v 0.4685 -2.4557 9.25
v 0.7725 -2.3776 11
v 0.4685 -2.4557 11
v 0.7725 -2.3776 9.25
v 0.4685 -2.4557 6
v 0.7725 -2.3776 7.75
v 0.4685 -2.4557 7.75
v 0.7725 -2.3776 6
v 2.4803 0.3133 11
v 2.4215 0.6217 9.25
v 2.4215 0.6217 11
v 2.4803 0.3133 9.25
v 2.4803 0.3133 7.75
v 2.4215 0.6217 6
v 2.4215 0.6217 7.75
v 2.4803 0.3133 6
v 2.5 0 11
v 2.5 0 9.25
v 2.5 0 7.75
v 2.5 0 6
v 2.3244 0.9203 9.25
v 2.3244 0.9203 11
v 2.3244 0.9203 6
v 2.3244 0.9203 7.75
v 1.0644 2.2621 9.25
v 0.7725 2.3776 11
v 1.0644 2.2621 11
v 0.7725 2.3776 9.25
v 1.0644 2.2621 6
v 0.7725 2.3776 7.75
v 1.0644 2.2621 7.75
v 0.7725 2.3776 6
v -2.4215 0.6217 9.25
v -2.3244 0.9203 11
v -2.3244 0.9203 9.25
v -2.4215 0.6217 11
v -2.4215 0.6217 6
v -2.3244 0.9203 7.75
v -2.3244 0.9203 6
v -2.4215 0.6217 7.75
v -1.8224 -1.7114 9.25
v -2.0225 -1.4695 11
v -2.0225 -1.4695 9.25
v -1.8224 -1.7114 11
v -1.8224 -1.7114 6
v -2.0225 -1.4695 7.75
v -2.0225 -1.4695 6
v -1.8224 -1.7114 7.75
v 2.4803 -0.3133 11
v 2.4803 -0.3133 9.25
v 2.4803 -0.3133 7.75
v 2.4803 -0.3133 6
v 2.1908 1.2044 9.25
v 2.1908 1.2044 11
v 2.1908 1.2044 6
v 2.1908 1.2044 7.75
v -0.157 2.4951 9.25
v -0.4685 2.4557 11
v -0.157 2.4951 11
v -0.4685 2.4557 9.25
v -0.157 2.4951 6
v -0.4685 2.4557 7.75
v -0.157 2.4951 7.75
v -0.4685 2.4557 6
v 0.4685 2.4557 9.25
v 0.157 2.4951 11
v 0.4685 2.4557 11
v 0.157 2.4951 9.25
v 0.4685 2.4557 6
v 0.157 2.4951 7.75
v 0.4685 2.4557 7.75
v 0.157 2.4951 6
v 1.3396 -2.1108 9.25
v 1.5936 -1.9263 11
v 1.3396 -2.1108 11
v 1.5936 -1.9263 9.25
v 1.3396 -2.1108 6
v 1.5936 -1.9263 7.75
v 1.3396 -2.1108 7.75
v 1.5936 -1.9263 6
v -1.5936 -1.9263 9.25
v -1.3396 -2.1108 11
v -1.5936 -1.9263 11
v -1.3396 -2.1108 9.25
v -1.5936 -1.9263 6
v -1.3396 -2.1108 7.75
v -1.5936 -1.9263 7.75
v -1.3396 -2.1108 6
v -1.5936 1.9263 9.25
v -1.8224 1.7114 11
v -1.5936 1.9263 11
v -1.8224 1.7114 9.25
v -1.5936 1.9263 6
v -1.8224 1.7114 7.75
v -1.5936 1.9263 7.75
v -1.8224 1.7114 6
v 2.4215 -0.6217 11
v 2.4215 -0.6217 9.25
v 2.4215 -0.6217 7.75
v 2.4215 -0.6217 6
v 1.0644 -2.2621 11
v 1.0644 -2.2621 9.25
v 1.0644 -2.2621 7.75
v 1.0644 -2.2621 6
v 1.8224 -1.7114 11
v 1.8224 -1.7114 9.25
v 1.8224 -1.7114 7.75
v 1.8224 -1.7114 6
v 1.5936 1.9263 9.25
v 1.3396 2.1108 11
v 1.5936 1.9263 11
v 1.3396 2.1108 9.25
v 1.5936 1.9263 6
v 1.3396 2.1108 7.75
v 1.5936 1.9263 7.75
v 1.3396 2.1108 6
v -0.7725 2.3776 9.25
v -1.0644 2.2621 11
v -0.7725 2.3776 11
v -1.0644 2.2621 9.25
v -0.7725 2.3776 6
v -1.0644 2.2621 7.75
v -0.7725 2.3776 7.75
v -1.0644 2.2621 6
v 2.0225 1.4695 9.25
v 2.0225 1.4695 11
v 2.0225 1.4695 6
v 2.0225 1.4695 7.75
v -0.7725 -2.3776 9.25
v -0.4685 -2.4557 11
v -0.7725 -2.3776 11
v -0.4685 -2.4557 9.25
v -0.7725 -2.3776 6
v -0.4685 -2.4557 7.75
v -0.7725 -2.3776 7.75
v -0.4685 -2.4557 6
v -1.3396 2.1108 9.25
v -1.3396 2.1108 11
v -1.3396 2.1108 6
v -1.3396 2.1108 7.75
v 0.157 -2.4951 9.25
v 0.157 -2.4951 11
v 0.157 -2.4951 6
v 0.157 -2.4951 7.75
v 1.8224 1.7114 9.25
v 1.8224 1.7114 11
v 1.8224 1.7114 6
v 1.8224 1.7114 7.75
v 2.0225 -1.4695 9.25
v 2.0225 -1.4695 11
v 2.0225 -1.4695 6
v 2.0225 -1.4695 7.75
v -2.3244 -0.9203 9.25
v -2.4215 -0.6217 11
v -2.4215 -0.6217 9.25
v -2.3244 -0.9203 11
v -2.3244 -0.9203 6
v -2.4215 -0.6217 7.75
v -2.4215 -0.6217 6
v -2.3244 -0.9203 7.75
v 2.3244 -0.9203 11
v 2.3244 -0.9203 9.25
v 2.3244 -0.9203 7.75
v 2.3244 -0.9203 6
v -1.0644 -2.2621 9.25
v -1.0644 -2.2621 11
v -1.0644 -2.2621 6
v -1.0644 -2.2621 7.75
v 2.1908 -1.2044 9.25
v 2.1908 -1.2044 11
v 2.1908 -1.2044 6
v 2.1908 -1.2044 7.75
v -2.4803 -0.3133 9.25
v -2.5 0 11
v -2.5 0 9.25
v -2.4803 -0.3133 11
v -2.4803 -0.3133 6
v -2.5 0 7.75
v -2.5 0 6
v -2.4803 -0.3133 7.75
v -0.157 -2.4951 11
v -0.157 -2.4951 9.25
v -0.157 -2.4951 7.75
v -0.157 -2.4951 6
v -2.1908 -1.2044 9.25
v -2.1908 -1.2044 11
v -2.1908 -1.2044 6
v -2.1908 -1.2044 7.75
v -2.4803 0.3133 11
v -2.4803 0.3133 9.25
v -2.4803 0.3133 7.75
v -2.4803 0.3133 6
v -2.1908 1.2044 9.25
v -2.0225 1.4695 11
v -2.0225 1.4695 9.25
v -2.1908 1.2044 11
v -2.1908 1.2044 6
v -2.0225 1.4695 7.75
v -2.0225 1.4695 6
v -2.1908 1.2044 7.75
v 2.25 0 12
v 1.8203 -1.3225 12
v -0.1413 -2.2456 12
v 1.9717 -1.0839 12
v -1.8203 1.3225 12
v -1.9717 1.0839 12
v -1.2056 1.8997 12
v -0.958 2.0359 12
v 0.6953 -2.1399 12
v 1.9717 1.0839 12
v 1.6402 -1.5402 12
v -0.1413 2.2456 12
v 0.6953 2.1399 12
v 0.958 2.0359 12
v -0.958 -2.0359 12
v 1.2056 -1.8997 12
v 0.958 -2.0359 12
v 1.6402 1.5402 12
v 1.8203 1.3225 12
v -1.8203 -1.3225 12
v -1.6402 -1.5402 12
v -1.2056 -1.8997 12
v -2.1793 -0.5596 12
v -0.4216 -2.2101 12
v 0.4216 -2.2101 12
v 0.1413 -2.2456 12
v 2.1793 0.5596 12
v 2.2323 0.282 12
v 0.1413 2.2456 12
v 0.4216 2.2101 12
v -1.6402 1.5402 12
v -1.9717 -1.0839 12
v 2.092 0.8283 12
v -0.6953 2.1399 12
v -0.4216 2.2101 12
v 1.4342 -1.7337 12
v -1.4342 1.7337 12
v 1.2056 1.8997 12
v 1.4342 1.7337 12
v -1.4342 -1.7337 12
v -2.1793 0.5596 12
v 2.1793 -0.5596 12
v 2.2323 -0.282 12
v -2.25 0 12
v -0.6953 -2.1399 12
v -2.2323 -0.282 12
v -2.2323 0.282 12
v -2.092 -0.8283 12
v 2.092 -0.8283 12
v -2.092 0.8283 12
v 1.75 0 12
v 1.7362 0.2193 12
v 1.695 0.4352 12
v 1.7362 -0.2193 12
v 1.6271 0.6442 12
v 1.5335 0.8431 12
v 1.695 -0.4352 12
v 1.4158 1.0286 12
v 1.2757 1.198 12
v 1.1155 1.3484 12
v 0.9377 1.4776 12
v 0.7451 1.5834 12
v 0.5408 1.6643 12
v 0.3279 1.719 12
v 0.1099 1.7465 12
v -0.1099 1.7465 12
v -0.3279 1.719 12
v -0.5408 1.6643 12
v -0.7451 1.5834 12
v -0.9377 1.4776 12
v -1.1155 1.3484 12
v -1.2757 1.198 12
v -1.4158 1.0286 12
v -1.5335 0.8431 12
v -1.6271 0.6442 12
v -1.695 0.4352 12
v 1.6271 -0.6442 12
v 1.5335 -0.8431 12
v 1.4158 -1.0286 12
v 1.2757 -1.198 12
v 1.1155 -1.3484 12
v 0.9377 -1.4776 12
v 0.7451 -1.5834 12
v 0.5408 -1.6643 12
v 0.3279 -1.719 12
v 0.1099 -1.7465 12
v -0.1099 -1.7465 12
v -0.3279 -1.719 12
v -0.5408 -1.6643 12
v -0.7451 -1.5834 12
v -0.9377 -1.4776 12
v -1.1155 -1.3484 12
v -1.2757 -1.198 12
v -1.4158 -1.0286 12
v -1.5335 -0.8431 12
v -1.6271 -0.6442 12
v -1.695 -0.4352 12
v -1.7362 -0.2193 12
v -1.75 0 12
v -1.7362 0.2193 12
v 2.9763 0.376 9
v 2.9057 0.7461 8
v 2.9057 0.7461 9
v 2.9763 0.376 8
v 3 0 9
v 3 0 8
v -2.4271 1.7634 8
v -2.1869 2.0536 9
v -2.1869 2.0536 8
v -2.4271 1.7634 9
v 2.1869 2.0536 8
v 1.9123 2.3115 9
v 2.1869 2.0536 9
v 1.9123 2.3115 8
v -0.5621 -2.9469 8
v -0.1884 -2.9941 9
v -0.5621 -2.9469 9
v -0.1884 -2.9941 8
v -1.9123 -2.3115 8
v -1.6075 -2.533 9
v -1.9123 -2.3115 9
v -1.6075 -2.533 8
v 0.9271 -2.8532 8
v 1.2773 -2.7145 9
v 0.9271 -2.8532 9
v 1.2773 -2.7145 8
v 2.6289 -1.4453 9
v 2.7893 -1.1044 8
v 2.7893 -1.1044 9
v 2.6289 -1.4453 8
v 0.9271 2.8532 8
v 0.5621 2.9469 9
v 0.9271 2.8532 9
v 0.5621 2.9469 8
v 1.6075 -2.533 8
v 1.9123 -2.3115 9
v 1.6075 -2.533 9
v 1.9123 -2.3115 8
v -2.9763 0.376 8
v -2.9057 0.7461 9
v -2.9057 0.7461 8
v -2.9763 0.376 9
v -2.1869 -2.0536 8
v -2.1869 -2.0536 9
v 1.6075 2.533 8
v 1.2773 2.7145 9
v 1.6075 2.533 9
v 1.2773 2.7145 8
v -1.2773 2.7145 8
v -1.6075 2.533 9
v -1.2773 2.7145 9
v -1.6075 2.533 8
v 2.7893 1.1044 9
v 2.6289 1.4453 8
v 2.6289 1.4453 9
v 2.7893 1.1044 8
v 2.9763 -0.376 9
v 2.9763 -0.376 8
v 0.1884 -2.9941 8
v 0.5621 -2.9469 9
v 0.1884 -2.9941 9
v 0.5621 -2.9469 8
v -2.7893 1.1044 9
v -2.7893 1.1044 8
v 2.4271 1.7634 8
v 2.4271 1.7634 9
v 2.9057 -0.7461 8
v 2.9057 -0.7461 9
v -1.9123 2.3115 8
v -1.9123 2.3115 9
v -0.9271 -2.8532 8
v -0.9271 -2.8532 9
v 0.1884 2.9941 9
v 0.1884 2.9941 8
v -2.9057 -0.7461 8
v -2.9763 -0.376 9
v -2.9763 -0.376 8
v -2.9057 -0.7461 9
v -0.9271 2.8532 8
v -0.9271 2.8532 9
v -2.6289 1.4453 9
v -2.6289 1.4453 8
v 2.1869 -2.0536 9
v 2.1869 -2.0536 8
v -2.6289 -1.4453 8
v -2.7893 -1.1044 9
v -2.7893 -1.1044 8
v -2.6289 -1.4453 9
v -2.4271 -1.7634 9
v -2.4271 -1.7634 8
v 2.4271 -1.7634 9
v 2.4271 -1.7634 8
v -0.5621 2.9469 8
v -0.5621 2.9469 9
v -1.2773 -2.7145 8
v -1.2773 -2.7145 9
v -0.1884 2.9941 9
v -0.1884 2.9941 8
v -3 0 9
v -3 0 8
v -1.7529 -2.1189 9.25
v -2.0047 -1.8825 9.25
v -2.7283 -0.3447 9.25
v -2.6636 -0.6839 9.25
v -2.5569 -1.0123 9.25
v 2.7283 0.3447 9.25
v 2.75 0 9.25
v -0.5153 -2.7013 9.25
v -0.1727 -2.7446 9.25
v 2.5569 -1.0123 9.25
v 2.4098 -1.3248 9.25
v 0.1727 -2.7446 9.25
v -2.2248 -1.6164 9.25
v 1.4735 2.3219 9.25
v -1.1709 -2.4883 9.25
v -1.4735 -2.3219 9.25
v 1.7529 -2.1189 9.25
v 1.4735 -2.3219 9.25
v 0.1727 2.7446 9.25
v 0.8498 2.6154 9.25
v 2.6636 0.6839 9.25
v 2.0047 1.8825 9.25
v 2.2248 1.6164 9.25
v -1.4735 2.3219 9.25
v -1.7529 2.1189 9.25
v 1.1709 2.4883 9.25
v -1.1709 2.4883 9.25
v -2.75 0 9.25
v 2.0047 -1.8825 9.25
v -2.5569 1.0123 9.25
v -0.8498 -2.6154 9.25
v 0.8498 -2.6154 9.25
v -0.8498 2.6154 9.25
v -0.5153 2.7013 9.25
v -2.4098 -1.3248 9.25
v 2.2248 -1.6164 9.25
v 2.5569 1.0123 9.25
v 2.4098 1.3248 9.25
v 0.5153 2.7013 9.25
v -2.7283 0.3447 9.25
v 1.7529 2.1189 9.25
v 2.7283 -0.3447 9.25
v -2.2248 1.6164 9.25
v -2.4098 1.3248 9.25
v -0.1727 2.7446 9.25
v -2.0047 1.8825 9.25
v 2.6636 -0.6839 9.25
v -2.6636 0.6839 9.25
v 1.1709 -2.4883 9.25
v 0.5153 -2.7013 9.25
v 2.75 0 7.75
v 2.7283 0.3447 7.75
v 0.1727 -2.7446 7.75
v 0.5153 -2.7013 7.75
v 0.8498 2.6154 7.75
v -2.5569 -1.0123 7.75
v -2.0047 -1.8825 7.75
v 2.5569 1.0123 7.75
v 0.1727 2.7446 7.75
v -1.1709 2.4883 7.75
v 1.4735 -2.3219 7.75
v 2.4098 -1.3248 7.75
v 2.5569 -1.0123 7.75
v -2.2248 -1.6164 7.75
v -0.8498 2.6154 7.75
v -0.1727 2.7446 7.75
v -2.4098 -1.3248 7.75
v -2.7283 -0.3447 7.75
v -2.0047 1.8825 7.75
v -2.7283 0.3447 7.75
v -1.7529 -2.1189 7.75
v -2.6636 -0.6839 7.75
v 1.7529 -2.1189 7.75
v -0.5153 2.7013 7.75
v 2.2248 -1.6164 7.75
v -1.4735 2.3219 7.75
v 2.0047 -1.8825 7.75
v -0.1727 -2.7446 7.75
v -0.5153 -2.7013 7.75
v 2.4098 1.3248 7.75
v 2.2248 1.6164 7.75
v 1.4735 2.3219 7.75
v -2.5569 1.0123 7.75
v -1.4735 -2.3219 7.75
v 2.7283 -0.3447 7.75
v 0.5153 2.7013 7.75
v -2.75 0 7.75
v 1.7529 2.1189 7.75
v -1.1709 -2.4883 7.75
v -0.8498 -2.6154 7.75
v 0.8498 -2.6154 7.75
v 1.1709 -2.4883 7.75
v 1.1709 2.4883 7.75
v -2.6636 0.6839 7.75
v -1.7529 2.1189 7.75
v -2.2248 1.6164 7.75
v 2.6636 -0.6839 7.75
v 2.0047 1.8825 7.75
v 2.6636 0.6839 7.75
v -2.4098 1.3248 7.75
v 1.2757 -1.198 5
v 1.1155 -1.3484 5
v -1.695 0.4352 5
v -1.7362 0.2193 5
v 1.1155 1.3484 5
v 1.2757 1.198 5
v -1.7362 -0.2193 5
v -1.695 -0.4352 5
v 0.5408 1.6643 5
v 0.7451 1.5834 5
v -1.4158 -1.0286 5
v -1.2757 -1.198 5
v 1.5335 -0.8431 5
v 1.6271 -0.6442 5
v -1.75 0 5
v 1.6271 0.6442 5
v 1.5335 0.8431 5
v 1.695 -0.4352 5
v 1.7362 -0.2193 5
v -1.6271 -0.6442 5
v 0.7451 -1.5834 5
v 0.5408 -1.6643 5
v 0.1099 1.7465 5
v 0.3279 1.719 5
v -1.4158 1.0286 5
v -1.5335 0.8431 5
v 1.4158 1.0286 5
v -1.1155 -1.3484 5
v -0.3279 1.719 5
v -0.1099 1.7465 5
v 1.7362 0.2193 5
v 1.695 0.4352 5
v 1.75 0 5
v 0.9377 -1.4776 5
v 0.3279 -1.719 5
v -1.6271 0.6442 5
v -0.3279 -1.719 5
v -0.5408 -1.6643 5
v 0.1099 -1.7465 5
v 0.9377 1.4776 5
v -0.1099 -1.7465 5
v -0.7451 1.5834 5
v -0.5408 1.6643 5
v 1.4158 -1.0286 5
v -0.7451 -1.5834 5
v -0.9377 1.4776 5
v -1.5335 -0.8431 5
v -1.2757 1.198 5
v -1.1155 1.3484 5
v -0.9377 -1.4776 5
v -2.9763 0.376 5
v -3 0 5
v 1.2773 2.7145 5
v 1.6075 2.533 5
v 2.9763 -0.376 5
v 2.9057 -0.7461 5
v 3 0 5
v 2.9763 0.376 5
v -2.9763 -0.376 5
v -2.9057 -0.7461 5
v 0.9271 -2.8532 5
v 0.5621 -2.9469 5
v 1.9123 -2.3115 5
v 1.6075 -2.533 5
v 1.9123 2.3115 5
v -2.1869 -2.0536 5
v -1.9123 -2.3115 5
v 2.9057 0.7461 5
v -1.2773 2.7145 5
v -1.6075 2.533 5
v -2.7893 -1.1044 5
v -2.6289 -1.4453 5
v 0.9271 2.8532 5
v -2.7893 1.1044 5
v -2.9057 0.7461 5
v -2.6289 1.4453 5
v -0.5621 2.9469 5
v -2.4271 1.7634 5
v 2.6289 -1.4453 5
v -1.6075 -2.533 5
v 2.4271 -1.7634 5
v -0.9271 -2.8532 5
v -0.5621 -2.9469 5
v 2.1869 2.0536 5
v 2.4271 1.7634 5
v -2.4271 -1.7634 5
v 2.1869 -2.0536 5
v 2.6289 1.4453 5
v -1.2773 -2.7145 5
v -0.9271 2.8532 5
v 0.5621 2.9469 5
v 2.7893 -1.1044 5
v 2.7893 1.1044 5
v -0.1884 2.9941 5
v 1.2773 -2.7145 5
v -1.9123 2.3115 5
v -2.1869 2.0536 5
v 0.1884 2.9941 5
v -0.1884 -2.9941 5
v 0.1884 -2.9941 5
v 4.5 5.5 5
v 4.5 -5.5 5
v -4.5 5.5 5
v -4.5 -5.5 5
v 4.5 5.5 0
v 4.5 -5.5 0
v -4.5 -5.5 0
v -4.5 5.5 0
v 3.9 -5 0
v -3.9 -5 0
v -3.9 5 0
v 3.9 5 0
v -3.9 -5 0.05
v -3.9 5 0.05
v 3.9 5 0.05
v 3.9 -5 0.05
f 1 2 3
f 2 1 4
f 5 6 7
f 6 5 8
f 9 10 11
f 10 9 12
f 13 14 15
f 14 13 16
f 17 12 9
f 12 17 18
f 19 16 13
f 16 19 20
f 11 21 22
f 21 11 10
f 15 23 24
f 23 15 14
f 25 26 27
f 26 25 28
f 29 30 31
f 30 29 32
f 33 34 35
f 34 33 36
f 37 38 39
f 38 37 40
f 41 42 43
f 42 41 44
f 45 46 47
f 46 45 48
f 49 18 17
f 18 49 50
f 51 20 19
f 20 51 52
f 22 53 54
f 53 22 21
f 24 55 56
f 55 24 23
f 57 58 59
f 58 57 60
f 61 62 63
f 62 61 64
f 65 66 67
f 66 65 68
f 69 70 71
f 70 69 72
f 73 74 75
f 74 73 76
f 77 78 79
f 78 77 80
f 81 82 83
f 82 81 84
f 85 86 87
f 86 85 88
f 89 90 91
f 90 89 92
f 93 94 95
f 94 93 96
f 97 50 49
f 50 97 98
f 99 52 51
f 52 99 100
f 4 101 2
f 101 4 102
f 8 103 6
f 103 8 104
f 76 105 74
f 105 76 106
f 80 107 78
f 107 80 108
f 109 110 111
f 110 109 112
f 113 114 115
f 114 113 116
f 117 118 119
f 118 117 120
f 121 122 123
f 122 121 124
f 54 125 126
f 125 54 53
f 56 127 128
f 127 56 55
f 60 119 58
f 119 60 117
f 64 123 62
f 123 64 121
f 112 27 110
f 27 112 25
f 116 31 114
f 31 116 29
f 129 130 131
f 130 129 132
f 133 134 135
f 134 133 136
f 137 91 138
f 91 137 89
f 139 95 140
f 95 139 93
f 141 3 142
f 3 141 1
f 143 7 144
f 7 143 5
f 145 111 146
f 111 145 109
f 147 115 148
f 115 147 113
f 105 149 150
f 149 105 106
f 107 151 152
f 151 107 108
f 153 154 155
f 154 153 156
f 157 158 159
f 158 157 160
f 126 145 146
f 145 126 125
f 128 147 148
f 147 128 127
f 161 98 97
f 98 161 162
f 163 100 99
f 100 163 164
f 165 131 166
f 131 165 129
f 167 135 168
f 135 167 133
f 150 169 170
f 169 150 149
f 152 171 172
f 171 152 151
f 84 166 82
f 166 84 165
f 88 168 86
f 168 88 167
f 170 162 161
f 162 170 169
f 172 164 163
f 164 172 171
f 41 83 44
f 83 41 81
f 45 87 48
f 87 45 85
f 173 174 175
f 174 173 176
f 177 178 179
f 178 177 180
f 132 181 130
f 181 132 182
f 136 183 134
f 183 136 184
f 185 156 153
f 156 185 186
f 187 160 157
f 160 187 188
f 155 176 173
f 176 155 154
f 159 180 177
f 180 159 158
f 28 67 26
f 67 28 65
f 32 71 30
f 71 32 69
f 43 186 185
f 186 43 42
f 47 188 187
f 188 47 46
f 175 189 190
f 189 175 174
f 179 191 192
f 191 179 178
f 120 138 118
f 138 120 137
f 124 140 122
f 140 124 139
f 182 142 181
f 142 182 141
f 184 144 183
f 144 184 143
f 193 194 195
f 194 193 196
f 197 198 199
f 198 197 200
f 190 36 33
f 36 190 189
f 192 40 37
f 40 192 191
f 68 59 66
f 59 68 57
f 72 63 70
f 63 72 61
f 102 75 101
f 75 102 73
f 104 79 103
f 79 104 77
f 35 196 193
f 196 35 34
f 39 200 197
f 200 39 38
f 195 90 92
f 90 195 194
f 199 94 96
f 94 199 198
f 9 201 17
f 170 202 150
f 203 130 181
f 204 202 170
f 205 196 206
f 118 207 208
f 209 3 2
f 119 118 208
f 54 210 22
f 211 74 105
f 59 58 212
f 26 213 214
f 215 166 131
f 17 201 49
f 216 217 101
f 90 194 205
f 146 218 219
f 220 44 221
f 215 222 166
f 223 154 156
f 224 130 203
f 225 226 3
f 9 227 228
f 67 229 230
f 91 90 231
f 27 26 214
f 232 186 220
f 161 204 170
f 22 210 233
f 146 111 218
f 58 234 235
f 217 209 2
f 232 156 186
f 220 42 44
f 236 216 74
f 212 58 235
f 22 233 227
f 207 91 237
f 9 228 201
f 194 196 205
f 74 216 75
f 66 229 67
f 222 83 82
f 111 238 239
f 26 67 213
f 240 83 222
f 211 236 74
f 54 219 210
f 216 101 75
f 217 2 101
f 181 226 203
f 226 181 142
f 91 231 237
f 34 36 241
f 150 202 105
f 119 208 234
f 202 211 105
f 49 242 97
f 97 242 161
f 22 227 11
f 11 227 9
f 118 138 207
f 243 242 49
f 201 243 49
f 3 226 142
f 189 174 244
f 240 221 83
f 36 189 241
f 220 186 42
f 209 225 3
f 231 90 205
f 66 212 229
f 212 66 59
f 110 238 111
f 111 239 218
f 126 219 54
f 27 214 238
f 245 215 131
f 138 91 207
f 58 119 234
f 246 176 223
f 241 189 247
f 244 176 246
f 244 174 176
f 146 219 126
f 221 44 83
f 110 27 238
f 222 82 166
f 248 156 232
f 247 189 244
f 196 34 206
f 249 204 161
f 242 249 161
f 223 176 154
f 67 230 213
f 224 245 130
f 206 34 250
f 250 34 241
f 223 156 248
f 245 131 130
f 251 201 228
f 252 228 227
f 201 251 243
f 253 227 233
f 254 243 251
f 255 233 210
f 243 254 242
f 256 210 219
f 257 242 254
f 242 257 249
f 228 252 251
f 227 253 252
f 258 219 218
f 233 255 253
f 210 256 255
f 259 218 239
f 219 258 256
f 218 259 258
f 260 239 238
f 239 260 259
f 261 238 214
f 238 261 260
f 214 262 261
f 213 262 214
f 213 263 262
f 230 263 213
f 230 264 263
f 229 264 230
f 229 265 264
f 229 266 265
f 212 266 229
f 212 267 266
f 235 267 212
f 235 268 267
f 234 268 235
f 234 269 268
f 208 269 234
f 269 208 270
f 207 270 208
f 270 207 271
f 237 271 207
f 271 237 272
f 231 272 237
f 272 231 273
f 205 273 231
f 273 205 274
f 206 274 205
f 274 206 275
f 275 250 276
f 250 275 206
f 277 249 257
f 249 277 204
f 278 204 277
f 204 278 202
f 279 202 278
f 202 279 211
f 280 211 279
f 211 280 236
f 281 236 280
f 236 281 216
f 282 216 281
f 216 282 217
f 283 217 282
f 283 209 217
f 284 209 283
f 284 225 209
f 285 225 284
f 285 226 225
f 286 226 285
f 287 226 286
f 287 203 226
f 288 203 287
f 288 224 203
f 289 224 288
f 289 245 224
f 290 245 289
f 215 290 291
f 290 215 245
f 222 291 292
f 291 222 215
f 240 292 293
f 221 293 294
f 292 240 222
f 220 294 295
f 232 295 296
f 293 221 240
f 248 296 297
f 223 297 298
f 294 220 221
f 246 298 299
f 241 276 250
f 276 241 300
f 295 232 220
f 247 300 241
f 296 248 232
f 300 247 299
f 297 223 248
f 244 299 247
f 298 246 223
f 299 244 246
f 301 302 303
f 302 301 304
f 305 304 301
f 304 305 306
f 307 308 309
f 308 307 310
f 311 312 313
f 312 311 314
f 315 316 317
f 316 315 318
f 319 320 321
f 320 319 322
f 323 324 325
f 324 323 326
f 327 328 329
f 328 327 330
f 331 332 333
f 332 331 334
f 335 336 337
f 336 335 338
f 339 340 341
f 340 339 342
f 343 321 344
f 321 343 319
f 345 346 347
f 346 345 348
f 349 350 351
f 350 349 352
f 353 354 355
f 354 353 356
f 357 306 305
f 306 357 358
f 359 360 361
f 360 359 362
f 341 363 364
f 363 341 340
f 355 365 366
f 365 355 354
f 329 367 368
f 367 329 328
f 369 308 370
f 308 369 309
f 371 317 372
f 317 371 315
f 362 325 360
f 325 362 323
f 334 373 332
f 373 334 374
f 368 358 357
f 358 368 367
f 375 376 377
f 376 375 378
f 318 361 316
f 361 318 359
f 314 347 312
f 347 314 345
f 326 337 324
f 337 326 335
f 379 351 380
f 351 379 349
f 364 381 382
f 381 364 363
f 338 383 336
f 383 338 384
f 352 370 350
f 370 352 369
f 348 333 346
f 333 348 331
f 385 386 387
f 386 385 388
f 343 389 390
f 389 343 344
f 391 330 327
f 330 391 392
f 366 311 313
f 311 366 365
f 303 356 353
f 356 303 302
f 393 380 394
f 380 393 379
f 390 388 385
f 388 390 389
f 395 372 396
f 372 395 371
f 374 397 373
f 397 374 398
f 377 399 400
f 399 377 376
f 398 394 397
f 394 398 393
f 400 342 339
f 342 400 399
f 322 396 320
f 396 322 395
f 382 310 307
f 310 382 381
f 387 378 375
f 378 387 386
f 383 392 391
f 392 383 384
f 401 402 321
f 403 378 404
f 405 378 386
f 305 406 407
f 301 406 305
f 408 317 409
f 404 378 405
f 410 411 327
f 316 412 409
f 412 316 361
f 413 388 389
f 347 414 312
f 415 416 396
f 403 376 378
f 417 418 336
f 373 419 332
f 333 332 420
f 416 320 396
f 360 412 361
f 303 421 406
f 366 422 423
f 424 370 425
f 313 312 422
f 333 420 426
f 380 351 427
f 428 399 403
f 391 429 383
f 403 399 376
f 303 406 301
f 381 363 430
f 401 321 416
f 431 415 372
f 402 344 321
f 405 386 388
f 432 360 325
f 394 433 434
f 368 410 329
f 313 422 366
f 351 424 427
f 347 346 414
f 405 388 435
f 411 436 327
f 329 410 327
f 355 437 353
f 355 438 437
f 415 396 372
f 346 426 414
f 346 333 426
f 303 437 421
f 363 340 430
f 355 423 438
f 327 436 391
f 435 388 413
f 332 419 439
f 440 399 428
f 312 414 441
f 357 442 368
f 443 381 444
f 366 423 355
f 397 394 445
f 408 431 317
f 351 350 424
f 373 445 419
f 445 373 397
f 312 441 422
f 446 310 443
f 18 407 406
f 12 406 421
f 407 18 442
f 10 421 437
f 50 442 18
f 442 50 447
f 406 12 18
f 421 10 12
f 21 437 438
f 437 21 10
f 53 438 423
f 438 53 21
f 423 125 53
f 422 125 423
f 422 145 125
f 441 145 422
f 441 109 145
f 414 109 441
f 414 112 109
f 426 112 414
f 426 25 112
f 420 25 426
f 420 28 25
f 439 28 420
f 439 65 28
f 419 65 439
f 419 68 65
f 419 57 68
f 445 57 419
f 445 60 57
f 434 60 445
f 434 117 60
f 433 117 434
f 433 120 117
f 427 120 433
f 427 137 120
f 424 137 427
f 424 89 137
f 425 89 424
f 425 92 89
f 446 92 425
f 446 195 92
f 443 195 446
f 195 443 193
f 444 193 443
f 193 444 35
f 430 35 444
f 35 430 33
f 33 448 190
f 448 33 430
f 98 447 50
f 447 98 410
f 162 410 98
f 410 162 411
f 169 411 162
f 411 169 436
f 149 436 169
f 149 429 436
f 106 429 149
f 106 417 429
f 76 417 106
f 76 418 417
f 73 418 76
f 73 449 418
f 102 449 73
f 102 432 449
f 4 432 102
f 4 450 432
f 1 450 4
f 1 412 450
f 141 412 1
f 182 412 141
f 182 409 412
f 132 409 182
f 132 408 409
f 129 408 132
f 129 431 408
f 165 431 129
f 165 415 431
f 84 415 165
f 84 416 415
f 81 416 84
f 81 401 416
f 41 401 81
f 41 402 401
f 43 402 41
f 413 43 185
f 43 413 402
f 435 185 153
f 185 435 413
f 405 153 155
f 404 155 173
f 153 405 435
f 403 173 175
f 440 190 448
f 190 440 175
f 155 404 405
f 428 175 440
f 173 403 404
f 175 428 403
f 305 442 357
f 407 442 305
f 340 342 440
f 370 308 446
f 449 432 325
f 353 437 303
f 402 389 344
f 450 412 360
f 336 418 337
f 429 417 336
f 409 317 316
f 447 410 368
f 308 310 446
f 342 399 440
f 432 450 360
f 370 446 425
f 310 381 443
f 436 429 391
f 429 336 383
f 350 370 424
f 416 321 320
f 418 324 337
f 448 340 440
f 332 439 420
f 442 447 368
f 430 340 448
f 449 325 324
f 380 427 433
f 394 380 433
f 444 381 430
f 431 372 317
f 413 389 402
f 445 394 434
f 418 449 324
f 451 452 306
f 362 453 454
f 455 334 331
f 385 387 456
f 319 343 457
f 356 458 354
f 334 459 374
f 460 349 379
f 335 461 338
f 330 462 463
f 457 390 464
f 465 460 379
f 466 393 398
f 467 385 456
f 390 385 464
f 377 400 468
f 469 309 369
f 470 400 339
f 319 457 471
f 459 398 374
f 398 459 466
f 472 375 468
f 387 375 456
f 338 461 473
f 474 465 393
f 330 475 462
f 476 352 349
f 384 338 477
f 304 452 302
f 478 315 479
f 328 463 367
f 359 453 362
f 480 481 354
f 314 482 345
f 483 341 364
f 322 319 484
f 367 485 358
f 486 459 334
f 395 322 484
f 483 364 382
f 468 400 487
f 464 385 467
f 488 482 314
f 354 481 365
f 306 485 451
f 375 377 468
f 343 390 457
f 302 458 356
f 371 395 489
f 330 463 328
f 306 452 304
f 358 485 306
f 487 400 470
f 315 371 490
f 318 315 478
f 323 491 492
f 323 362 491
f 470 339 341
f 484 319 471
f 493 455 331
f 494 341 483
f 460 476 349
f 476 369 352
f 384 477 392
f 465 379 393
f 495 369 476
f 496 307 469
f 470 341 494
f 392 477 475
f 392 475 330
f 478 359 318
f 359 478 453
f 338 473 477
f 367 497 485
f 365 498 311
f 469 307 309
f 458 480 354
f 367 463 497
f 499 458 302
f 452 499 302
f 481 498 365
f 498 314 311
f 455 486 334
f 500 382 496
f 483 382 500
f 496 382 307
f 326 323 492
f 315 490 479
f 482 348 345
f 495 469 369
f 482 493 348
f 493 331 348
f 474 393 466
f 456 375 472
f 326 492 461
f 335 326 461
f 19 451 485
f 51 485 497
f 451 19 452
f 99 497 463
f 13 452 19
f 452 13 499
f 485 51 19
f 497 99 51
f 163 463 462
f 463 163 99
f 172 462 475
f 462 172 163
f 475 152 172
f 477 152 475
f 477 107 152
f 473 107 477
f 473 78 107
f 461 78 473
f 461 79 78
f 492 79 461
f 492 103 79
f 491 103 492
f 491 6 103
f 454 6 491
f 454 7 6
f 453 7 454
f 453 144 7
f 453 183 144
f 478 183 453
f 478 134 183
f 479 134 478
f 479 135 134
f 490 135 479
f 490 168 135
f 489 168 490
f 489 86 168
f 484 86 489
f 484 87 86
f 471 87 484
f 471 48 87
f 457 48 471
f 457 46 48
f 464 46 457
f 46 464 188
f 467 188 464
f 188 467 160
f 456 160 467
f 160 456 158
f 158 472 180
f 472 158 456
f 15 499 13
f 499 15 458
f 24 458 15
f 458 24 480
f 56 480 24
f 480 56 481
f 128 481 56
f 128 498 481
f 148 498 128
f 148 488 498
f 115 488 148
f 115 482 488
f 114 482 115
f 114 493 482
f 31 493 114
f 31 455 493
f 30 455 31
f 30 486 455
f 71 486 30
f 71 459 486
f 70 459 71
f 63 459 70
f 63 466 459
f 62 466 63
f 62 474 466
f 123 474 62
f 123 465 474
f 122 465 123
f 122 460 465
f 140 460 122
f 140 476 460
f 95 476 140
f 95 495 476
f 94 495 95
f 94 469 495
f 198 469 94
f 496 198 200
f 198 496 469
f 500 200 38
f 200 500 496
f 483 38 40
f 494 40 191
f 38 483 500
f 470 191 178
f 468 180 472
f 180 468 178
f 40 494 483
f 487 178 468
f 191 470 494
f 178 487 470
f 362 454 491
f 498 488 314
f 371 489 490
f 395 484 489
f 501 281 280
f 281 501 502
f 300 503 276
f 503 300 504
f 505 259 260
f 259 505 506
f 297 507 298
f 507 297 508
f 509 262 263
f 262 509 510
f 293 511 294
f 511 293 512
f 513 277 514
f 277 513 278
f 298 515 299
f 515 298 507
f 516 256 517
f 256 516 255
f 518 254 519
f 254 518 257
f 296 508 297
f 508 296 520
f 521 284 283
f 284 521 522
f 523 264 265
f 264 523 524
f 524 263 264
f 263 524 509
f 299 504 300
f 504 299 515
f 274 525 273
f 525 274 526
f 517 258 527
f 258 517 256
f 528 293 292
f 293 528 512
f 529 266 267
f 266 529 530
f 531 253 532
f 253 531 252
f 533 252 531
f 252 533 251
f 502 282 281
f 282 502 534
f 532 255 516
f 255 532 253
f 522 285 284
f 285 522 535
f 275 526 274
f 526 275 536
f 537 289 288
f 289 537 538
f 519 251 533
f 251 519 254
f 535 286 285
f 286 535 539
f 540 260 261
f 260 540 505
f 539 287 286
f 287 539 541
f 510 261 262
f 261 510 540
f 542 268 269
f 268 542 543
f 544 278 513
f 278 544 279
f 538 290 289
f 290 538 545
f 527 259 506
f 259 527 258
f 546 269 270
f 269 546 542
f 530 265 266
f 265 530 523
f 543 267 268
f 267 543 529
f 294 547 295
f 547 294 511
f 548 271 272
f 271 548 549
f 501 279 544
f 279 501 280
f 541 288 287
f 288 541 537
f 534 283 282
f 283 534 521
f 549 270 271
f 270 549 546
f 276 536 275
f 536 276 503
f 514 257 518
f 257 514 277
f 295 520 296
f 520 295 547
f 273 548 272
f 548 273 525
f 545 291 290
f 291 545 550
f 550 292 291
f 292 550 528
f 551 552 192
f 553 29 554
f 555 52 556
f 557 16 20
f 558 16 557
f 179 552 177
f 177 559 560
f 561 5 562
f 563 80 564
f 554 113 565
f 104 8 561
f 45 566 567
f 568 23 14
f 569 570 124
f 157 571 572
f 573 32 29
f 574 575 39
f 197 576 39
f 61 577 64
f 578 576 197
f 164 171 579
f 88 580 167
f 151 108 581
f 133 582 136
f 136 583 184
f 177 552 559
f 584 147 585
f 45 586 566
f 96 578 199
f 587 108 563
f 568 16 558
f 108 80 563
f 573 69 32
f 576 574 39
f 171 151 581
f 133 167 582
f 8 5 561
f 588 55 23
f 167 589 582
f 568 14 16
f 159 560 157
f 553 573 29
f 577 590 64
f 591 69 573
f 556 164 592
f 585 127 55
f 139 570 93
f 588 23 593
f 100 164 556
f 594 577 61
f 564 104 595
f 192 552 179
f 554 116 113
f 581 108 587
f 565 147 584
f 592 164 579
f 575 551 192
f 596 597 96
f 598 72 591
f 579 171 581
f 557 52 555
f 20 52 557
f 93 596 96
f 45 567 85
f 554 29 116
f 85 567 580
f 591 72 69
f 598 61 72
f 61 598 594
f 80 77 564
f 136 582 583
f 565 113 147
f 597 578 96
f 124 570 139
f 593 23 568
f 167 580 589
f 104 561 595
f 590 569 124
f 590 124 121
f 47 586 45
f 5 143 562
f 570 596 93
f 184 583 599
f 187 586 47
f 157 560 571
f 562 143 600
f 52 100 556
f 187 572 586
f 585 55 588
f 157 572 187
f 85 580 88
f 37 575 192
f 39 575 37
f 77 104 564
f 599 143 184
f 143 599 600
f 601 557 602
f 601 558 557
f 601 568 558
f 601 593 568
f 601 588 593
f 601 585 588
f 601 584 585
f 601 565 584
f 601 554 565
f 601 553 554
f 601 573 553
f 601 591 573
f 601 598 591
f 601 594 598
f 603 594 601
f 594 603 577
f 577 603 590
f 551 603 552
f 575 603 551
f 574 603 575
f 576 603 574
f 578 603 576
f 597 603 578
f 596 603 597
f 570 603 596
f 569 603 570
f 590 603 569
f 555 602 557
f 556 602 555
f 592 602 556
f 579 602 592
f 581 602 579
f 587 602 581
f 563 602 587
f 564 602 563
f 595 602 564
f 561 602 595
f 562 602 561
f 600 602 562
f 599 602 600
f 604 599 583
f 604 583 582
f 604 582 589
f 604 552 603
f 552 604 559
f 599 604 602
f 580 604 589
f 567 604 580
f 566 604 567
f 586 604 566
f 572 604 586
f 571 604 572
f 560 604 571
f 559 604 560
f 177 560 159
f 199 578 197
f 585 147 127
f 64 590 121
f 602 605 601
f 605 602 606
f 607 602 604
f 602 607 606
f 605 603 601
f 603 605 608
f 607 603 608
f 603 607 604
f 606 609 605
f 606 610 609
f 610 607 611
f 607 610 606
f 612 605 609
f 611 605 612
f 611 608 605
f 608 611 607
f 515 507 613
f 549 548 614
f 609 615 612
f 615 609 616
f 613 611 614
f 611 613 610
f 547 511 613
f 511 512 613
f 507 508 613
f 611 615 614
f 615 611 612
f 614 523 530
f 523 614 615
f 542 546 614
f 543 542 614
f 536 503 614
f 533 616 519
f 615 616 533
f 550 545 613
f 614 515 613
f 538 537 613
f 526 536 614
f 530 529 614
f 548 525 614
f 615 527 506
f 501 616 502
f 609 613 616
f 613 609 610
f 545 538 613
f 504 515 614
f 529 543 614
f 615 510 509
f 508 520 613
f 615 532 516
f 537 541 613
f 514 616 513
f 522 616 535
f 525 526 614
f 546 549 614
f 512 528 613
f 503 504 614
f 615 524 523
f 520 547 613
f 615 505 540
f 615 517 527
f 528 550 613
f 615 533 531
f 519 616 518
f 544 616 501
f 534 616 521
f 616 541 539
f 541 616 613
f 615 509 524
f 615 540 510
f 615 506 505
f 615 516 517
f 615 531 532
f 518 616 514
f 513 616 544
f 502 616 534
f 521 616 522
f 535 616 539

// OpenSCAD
$fn=50;

/*PumpHoseAdapter by Mattis Männel
This is a hose adapter for pmumps. It was designed for http://www.thingiverse.com/thing:4881 but should be configureable for any size. Unfortunatly you'll have to merge the adapter to the pump manually in 3D-Design software which is able to load STL-file (i can personally recommend Blender for this purposes). 
*/

/* [Hose Adapter (Idigo, (and Purple, just for length)] */
hose_adapter_length = 7;
inner_diameter = 3.5; 
outer_diameter = 5;

/* [Size] */
width=9;    //9
length=11;   //5
height=5;  //11
hoppper_width=7.8;   
hopper_height=10;   

/* [Ring of the hose mount (Lime)] */
postion_of_the_ring = 3;
ring_diameter = 6;
ring_height = 1;
ring_bevel_difference = 0.5;
ring_bevel_height = 0.25;

/* [Hose adapters' end bevel (Light Purple)] */
end_bevel_differnce = 0.5;
end_bevel_length = 1;

/* [Hose mount guide (Deep Purple)] */
hose_mount_guide_factor = 1;
hose_mount_guide_length = 1;
hose_mount_wall_thickness_top = 0;
hose_mount_wall_thickness_bottom = 1;




module hoseAdapter()
{
    difference()
    {
        /// Don't forget it's rotated by 90° in x-direction later
        union()
        {
            color("Cyan")translate([0,height/2,0])cube([width,height,length],center=true);
            //hose mount guide
            color("MidnightBlue")translate([0,height,0])rotate([270,0,0])difference()
            {
                cylinder(hose_mount_guide_length,d1=outer_diameter * hose_mount_guide_factor + hose_mount_wall_thickness_bottom, d2=outer_diameter * hose_mount_guide_factor +hose_mount_wall_thickness_top);
                cylinder(hose_mount_guide_length,d=outer_diameter * hose_mount_guide_factor);
            }
        }
        
        //hopper
        color("SkyBlue")hull()
        {
            //circle(d=10);
            translate([0,height,0])rotate([90,0,0])cylinder(0.01,d=inner_diameter);
            cube([hoppper_width,.1,hopper_height],center=true);
        }
        //cut through the hose mount guide
        color("DarkSlateGray")translate([0,5,0])rotate([-90,0,0])translate([0,0,-1 ])cylinder(length+1,d=inner_diameter);
    }
    
    
}

module hoseMount()
{
    difference()
    {
        union()
        {
            color("Indigo")cylinder(hose_adapter_length-end_bevel_length,d=outer_diameter);
            color("Purple")translate([0,0,hose_adapter_length-end_bevel_length])cylinder(end_bevel_length,d1=outer_diameter,d2=outer_diameter-end_bevel_differnce);
            color("Lime")translate([0,0,postion_of_the_ring ])cylinder(ring_height,d=ring_diameter);
            color("Lime")translate([0,0,postion_of_the_ring + ring_height])cylinder(ring_bevel_height,d1=ring_diameter,d2=ring_diameter - ring_bevel_difference);
            color("Lime")translate([0,0,postion_of_the_ring - ring_bevel_height])cylinder(ring_bevel_height,d2=ring_diameter,d1=ring_diameter - ring_bevel_difference);
        }
        color("DarkSlateGray")translate([0,0,-0.4 ])cylinder(hose_adapter_length+1,d=inner_diameter);
    }
}

        
translate([0,0,height])hoseMount();
rotate([90,0,0])hoseAdapter();
